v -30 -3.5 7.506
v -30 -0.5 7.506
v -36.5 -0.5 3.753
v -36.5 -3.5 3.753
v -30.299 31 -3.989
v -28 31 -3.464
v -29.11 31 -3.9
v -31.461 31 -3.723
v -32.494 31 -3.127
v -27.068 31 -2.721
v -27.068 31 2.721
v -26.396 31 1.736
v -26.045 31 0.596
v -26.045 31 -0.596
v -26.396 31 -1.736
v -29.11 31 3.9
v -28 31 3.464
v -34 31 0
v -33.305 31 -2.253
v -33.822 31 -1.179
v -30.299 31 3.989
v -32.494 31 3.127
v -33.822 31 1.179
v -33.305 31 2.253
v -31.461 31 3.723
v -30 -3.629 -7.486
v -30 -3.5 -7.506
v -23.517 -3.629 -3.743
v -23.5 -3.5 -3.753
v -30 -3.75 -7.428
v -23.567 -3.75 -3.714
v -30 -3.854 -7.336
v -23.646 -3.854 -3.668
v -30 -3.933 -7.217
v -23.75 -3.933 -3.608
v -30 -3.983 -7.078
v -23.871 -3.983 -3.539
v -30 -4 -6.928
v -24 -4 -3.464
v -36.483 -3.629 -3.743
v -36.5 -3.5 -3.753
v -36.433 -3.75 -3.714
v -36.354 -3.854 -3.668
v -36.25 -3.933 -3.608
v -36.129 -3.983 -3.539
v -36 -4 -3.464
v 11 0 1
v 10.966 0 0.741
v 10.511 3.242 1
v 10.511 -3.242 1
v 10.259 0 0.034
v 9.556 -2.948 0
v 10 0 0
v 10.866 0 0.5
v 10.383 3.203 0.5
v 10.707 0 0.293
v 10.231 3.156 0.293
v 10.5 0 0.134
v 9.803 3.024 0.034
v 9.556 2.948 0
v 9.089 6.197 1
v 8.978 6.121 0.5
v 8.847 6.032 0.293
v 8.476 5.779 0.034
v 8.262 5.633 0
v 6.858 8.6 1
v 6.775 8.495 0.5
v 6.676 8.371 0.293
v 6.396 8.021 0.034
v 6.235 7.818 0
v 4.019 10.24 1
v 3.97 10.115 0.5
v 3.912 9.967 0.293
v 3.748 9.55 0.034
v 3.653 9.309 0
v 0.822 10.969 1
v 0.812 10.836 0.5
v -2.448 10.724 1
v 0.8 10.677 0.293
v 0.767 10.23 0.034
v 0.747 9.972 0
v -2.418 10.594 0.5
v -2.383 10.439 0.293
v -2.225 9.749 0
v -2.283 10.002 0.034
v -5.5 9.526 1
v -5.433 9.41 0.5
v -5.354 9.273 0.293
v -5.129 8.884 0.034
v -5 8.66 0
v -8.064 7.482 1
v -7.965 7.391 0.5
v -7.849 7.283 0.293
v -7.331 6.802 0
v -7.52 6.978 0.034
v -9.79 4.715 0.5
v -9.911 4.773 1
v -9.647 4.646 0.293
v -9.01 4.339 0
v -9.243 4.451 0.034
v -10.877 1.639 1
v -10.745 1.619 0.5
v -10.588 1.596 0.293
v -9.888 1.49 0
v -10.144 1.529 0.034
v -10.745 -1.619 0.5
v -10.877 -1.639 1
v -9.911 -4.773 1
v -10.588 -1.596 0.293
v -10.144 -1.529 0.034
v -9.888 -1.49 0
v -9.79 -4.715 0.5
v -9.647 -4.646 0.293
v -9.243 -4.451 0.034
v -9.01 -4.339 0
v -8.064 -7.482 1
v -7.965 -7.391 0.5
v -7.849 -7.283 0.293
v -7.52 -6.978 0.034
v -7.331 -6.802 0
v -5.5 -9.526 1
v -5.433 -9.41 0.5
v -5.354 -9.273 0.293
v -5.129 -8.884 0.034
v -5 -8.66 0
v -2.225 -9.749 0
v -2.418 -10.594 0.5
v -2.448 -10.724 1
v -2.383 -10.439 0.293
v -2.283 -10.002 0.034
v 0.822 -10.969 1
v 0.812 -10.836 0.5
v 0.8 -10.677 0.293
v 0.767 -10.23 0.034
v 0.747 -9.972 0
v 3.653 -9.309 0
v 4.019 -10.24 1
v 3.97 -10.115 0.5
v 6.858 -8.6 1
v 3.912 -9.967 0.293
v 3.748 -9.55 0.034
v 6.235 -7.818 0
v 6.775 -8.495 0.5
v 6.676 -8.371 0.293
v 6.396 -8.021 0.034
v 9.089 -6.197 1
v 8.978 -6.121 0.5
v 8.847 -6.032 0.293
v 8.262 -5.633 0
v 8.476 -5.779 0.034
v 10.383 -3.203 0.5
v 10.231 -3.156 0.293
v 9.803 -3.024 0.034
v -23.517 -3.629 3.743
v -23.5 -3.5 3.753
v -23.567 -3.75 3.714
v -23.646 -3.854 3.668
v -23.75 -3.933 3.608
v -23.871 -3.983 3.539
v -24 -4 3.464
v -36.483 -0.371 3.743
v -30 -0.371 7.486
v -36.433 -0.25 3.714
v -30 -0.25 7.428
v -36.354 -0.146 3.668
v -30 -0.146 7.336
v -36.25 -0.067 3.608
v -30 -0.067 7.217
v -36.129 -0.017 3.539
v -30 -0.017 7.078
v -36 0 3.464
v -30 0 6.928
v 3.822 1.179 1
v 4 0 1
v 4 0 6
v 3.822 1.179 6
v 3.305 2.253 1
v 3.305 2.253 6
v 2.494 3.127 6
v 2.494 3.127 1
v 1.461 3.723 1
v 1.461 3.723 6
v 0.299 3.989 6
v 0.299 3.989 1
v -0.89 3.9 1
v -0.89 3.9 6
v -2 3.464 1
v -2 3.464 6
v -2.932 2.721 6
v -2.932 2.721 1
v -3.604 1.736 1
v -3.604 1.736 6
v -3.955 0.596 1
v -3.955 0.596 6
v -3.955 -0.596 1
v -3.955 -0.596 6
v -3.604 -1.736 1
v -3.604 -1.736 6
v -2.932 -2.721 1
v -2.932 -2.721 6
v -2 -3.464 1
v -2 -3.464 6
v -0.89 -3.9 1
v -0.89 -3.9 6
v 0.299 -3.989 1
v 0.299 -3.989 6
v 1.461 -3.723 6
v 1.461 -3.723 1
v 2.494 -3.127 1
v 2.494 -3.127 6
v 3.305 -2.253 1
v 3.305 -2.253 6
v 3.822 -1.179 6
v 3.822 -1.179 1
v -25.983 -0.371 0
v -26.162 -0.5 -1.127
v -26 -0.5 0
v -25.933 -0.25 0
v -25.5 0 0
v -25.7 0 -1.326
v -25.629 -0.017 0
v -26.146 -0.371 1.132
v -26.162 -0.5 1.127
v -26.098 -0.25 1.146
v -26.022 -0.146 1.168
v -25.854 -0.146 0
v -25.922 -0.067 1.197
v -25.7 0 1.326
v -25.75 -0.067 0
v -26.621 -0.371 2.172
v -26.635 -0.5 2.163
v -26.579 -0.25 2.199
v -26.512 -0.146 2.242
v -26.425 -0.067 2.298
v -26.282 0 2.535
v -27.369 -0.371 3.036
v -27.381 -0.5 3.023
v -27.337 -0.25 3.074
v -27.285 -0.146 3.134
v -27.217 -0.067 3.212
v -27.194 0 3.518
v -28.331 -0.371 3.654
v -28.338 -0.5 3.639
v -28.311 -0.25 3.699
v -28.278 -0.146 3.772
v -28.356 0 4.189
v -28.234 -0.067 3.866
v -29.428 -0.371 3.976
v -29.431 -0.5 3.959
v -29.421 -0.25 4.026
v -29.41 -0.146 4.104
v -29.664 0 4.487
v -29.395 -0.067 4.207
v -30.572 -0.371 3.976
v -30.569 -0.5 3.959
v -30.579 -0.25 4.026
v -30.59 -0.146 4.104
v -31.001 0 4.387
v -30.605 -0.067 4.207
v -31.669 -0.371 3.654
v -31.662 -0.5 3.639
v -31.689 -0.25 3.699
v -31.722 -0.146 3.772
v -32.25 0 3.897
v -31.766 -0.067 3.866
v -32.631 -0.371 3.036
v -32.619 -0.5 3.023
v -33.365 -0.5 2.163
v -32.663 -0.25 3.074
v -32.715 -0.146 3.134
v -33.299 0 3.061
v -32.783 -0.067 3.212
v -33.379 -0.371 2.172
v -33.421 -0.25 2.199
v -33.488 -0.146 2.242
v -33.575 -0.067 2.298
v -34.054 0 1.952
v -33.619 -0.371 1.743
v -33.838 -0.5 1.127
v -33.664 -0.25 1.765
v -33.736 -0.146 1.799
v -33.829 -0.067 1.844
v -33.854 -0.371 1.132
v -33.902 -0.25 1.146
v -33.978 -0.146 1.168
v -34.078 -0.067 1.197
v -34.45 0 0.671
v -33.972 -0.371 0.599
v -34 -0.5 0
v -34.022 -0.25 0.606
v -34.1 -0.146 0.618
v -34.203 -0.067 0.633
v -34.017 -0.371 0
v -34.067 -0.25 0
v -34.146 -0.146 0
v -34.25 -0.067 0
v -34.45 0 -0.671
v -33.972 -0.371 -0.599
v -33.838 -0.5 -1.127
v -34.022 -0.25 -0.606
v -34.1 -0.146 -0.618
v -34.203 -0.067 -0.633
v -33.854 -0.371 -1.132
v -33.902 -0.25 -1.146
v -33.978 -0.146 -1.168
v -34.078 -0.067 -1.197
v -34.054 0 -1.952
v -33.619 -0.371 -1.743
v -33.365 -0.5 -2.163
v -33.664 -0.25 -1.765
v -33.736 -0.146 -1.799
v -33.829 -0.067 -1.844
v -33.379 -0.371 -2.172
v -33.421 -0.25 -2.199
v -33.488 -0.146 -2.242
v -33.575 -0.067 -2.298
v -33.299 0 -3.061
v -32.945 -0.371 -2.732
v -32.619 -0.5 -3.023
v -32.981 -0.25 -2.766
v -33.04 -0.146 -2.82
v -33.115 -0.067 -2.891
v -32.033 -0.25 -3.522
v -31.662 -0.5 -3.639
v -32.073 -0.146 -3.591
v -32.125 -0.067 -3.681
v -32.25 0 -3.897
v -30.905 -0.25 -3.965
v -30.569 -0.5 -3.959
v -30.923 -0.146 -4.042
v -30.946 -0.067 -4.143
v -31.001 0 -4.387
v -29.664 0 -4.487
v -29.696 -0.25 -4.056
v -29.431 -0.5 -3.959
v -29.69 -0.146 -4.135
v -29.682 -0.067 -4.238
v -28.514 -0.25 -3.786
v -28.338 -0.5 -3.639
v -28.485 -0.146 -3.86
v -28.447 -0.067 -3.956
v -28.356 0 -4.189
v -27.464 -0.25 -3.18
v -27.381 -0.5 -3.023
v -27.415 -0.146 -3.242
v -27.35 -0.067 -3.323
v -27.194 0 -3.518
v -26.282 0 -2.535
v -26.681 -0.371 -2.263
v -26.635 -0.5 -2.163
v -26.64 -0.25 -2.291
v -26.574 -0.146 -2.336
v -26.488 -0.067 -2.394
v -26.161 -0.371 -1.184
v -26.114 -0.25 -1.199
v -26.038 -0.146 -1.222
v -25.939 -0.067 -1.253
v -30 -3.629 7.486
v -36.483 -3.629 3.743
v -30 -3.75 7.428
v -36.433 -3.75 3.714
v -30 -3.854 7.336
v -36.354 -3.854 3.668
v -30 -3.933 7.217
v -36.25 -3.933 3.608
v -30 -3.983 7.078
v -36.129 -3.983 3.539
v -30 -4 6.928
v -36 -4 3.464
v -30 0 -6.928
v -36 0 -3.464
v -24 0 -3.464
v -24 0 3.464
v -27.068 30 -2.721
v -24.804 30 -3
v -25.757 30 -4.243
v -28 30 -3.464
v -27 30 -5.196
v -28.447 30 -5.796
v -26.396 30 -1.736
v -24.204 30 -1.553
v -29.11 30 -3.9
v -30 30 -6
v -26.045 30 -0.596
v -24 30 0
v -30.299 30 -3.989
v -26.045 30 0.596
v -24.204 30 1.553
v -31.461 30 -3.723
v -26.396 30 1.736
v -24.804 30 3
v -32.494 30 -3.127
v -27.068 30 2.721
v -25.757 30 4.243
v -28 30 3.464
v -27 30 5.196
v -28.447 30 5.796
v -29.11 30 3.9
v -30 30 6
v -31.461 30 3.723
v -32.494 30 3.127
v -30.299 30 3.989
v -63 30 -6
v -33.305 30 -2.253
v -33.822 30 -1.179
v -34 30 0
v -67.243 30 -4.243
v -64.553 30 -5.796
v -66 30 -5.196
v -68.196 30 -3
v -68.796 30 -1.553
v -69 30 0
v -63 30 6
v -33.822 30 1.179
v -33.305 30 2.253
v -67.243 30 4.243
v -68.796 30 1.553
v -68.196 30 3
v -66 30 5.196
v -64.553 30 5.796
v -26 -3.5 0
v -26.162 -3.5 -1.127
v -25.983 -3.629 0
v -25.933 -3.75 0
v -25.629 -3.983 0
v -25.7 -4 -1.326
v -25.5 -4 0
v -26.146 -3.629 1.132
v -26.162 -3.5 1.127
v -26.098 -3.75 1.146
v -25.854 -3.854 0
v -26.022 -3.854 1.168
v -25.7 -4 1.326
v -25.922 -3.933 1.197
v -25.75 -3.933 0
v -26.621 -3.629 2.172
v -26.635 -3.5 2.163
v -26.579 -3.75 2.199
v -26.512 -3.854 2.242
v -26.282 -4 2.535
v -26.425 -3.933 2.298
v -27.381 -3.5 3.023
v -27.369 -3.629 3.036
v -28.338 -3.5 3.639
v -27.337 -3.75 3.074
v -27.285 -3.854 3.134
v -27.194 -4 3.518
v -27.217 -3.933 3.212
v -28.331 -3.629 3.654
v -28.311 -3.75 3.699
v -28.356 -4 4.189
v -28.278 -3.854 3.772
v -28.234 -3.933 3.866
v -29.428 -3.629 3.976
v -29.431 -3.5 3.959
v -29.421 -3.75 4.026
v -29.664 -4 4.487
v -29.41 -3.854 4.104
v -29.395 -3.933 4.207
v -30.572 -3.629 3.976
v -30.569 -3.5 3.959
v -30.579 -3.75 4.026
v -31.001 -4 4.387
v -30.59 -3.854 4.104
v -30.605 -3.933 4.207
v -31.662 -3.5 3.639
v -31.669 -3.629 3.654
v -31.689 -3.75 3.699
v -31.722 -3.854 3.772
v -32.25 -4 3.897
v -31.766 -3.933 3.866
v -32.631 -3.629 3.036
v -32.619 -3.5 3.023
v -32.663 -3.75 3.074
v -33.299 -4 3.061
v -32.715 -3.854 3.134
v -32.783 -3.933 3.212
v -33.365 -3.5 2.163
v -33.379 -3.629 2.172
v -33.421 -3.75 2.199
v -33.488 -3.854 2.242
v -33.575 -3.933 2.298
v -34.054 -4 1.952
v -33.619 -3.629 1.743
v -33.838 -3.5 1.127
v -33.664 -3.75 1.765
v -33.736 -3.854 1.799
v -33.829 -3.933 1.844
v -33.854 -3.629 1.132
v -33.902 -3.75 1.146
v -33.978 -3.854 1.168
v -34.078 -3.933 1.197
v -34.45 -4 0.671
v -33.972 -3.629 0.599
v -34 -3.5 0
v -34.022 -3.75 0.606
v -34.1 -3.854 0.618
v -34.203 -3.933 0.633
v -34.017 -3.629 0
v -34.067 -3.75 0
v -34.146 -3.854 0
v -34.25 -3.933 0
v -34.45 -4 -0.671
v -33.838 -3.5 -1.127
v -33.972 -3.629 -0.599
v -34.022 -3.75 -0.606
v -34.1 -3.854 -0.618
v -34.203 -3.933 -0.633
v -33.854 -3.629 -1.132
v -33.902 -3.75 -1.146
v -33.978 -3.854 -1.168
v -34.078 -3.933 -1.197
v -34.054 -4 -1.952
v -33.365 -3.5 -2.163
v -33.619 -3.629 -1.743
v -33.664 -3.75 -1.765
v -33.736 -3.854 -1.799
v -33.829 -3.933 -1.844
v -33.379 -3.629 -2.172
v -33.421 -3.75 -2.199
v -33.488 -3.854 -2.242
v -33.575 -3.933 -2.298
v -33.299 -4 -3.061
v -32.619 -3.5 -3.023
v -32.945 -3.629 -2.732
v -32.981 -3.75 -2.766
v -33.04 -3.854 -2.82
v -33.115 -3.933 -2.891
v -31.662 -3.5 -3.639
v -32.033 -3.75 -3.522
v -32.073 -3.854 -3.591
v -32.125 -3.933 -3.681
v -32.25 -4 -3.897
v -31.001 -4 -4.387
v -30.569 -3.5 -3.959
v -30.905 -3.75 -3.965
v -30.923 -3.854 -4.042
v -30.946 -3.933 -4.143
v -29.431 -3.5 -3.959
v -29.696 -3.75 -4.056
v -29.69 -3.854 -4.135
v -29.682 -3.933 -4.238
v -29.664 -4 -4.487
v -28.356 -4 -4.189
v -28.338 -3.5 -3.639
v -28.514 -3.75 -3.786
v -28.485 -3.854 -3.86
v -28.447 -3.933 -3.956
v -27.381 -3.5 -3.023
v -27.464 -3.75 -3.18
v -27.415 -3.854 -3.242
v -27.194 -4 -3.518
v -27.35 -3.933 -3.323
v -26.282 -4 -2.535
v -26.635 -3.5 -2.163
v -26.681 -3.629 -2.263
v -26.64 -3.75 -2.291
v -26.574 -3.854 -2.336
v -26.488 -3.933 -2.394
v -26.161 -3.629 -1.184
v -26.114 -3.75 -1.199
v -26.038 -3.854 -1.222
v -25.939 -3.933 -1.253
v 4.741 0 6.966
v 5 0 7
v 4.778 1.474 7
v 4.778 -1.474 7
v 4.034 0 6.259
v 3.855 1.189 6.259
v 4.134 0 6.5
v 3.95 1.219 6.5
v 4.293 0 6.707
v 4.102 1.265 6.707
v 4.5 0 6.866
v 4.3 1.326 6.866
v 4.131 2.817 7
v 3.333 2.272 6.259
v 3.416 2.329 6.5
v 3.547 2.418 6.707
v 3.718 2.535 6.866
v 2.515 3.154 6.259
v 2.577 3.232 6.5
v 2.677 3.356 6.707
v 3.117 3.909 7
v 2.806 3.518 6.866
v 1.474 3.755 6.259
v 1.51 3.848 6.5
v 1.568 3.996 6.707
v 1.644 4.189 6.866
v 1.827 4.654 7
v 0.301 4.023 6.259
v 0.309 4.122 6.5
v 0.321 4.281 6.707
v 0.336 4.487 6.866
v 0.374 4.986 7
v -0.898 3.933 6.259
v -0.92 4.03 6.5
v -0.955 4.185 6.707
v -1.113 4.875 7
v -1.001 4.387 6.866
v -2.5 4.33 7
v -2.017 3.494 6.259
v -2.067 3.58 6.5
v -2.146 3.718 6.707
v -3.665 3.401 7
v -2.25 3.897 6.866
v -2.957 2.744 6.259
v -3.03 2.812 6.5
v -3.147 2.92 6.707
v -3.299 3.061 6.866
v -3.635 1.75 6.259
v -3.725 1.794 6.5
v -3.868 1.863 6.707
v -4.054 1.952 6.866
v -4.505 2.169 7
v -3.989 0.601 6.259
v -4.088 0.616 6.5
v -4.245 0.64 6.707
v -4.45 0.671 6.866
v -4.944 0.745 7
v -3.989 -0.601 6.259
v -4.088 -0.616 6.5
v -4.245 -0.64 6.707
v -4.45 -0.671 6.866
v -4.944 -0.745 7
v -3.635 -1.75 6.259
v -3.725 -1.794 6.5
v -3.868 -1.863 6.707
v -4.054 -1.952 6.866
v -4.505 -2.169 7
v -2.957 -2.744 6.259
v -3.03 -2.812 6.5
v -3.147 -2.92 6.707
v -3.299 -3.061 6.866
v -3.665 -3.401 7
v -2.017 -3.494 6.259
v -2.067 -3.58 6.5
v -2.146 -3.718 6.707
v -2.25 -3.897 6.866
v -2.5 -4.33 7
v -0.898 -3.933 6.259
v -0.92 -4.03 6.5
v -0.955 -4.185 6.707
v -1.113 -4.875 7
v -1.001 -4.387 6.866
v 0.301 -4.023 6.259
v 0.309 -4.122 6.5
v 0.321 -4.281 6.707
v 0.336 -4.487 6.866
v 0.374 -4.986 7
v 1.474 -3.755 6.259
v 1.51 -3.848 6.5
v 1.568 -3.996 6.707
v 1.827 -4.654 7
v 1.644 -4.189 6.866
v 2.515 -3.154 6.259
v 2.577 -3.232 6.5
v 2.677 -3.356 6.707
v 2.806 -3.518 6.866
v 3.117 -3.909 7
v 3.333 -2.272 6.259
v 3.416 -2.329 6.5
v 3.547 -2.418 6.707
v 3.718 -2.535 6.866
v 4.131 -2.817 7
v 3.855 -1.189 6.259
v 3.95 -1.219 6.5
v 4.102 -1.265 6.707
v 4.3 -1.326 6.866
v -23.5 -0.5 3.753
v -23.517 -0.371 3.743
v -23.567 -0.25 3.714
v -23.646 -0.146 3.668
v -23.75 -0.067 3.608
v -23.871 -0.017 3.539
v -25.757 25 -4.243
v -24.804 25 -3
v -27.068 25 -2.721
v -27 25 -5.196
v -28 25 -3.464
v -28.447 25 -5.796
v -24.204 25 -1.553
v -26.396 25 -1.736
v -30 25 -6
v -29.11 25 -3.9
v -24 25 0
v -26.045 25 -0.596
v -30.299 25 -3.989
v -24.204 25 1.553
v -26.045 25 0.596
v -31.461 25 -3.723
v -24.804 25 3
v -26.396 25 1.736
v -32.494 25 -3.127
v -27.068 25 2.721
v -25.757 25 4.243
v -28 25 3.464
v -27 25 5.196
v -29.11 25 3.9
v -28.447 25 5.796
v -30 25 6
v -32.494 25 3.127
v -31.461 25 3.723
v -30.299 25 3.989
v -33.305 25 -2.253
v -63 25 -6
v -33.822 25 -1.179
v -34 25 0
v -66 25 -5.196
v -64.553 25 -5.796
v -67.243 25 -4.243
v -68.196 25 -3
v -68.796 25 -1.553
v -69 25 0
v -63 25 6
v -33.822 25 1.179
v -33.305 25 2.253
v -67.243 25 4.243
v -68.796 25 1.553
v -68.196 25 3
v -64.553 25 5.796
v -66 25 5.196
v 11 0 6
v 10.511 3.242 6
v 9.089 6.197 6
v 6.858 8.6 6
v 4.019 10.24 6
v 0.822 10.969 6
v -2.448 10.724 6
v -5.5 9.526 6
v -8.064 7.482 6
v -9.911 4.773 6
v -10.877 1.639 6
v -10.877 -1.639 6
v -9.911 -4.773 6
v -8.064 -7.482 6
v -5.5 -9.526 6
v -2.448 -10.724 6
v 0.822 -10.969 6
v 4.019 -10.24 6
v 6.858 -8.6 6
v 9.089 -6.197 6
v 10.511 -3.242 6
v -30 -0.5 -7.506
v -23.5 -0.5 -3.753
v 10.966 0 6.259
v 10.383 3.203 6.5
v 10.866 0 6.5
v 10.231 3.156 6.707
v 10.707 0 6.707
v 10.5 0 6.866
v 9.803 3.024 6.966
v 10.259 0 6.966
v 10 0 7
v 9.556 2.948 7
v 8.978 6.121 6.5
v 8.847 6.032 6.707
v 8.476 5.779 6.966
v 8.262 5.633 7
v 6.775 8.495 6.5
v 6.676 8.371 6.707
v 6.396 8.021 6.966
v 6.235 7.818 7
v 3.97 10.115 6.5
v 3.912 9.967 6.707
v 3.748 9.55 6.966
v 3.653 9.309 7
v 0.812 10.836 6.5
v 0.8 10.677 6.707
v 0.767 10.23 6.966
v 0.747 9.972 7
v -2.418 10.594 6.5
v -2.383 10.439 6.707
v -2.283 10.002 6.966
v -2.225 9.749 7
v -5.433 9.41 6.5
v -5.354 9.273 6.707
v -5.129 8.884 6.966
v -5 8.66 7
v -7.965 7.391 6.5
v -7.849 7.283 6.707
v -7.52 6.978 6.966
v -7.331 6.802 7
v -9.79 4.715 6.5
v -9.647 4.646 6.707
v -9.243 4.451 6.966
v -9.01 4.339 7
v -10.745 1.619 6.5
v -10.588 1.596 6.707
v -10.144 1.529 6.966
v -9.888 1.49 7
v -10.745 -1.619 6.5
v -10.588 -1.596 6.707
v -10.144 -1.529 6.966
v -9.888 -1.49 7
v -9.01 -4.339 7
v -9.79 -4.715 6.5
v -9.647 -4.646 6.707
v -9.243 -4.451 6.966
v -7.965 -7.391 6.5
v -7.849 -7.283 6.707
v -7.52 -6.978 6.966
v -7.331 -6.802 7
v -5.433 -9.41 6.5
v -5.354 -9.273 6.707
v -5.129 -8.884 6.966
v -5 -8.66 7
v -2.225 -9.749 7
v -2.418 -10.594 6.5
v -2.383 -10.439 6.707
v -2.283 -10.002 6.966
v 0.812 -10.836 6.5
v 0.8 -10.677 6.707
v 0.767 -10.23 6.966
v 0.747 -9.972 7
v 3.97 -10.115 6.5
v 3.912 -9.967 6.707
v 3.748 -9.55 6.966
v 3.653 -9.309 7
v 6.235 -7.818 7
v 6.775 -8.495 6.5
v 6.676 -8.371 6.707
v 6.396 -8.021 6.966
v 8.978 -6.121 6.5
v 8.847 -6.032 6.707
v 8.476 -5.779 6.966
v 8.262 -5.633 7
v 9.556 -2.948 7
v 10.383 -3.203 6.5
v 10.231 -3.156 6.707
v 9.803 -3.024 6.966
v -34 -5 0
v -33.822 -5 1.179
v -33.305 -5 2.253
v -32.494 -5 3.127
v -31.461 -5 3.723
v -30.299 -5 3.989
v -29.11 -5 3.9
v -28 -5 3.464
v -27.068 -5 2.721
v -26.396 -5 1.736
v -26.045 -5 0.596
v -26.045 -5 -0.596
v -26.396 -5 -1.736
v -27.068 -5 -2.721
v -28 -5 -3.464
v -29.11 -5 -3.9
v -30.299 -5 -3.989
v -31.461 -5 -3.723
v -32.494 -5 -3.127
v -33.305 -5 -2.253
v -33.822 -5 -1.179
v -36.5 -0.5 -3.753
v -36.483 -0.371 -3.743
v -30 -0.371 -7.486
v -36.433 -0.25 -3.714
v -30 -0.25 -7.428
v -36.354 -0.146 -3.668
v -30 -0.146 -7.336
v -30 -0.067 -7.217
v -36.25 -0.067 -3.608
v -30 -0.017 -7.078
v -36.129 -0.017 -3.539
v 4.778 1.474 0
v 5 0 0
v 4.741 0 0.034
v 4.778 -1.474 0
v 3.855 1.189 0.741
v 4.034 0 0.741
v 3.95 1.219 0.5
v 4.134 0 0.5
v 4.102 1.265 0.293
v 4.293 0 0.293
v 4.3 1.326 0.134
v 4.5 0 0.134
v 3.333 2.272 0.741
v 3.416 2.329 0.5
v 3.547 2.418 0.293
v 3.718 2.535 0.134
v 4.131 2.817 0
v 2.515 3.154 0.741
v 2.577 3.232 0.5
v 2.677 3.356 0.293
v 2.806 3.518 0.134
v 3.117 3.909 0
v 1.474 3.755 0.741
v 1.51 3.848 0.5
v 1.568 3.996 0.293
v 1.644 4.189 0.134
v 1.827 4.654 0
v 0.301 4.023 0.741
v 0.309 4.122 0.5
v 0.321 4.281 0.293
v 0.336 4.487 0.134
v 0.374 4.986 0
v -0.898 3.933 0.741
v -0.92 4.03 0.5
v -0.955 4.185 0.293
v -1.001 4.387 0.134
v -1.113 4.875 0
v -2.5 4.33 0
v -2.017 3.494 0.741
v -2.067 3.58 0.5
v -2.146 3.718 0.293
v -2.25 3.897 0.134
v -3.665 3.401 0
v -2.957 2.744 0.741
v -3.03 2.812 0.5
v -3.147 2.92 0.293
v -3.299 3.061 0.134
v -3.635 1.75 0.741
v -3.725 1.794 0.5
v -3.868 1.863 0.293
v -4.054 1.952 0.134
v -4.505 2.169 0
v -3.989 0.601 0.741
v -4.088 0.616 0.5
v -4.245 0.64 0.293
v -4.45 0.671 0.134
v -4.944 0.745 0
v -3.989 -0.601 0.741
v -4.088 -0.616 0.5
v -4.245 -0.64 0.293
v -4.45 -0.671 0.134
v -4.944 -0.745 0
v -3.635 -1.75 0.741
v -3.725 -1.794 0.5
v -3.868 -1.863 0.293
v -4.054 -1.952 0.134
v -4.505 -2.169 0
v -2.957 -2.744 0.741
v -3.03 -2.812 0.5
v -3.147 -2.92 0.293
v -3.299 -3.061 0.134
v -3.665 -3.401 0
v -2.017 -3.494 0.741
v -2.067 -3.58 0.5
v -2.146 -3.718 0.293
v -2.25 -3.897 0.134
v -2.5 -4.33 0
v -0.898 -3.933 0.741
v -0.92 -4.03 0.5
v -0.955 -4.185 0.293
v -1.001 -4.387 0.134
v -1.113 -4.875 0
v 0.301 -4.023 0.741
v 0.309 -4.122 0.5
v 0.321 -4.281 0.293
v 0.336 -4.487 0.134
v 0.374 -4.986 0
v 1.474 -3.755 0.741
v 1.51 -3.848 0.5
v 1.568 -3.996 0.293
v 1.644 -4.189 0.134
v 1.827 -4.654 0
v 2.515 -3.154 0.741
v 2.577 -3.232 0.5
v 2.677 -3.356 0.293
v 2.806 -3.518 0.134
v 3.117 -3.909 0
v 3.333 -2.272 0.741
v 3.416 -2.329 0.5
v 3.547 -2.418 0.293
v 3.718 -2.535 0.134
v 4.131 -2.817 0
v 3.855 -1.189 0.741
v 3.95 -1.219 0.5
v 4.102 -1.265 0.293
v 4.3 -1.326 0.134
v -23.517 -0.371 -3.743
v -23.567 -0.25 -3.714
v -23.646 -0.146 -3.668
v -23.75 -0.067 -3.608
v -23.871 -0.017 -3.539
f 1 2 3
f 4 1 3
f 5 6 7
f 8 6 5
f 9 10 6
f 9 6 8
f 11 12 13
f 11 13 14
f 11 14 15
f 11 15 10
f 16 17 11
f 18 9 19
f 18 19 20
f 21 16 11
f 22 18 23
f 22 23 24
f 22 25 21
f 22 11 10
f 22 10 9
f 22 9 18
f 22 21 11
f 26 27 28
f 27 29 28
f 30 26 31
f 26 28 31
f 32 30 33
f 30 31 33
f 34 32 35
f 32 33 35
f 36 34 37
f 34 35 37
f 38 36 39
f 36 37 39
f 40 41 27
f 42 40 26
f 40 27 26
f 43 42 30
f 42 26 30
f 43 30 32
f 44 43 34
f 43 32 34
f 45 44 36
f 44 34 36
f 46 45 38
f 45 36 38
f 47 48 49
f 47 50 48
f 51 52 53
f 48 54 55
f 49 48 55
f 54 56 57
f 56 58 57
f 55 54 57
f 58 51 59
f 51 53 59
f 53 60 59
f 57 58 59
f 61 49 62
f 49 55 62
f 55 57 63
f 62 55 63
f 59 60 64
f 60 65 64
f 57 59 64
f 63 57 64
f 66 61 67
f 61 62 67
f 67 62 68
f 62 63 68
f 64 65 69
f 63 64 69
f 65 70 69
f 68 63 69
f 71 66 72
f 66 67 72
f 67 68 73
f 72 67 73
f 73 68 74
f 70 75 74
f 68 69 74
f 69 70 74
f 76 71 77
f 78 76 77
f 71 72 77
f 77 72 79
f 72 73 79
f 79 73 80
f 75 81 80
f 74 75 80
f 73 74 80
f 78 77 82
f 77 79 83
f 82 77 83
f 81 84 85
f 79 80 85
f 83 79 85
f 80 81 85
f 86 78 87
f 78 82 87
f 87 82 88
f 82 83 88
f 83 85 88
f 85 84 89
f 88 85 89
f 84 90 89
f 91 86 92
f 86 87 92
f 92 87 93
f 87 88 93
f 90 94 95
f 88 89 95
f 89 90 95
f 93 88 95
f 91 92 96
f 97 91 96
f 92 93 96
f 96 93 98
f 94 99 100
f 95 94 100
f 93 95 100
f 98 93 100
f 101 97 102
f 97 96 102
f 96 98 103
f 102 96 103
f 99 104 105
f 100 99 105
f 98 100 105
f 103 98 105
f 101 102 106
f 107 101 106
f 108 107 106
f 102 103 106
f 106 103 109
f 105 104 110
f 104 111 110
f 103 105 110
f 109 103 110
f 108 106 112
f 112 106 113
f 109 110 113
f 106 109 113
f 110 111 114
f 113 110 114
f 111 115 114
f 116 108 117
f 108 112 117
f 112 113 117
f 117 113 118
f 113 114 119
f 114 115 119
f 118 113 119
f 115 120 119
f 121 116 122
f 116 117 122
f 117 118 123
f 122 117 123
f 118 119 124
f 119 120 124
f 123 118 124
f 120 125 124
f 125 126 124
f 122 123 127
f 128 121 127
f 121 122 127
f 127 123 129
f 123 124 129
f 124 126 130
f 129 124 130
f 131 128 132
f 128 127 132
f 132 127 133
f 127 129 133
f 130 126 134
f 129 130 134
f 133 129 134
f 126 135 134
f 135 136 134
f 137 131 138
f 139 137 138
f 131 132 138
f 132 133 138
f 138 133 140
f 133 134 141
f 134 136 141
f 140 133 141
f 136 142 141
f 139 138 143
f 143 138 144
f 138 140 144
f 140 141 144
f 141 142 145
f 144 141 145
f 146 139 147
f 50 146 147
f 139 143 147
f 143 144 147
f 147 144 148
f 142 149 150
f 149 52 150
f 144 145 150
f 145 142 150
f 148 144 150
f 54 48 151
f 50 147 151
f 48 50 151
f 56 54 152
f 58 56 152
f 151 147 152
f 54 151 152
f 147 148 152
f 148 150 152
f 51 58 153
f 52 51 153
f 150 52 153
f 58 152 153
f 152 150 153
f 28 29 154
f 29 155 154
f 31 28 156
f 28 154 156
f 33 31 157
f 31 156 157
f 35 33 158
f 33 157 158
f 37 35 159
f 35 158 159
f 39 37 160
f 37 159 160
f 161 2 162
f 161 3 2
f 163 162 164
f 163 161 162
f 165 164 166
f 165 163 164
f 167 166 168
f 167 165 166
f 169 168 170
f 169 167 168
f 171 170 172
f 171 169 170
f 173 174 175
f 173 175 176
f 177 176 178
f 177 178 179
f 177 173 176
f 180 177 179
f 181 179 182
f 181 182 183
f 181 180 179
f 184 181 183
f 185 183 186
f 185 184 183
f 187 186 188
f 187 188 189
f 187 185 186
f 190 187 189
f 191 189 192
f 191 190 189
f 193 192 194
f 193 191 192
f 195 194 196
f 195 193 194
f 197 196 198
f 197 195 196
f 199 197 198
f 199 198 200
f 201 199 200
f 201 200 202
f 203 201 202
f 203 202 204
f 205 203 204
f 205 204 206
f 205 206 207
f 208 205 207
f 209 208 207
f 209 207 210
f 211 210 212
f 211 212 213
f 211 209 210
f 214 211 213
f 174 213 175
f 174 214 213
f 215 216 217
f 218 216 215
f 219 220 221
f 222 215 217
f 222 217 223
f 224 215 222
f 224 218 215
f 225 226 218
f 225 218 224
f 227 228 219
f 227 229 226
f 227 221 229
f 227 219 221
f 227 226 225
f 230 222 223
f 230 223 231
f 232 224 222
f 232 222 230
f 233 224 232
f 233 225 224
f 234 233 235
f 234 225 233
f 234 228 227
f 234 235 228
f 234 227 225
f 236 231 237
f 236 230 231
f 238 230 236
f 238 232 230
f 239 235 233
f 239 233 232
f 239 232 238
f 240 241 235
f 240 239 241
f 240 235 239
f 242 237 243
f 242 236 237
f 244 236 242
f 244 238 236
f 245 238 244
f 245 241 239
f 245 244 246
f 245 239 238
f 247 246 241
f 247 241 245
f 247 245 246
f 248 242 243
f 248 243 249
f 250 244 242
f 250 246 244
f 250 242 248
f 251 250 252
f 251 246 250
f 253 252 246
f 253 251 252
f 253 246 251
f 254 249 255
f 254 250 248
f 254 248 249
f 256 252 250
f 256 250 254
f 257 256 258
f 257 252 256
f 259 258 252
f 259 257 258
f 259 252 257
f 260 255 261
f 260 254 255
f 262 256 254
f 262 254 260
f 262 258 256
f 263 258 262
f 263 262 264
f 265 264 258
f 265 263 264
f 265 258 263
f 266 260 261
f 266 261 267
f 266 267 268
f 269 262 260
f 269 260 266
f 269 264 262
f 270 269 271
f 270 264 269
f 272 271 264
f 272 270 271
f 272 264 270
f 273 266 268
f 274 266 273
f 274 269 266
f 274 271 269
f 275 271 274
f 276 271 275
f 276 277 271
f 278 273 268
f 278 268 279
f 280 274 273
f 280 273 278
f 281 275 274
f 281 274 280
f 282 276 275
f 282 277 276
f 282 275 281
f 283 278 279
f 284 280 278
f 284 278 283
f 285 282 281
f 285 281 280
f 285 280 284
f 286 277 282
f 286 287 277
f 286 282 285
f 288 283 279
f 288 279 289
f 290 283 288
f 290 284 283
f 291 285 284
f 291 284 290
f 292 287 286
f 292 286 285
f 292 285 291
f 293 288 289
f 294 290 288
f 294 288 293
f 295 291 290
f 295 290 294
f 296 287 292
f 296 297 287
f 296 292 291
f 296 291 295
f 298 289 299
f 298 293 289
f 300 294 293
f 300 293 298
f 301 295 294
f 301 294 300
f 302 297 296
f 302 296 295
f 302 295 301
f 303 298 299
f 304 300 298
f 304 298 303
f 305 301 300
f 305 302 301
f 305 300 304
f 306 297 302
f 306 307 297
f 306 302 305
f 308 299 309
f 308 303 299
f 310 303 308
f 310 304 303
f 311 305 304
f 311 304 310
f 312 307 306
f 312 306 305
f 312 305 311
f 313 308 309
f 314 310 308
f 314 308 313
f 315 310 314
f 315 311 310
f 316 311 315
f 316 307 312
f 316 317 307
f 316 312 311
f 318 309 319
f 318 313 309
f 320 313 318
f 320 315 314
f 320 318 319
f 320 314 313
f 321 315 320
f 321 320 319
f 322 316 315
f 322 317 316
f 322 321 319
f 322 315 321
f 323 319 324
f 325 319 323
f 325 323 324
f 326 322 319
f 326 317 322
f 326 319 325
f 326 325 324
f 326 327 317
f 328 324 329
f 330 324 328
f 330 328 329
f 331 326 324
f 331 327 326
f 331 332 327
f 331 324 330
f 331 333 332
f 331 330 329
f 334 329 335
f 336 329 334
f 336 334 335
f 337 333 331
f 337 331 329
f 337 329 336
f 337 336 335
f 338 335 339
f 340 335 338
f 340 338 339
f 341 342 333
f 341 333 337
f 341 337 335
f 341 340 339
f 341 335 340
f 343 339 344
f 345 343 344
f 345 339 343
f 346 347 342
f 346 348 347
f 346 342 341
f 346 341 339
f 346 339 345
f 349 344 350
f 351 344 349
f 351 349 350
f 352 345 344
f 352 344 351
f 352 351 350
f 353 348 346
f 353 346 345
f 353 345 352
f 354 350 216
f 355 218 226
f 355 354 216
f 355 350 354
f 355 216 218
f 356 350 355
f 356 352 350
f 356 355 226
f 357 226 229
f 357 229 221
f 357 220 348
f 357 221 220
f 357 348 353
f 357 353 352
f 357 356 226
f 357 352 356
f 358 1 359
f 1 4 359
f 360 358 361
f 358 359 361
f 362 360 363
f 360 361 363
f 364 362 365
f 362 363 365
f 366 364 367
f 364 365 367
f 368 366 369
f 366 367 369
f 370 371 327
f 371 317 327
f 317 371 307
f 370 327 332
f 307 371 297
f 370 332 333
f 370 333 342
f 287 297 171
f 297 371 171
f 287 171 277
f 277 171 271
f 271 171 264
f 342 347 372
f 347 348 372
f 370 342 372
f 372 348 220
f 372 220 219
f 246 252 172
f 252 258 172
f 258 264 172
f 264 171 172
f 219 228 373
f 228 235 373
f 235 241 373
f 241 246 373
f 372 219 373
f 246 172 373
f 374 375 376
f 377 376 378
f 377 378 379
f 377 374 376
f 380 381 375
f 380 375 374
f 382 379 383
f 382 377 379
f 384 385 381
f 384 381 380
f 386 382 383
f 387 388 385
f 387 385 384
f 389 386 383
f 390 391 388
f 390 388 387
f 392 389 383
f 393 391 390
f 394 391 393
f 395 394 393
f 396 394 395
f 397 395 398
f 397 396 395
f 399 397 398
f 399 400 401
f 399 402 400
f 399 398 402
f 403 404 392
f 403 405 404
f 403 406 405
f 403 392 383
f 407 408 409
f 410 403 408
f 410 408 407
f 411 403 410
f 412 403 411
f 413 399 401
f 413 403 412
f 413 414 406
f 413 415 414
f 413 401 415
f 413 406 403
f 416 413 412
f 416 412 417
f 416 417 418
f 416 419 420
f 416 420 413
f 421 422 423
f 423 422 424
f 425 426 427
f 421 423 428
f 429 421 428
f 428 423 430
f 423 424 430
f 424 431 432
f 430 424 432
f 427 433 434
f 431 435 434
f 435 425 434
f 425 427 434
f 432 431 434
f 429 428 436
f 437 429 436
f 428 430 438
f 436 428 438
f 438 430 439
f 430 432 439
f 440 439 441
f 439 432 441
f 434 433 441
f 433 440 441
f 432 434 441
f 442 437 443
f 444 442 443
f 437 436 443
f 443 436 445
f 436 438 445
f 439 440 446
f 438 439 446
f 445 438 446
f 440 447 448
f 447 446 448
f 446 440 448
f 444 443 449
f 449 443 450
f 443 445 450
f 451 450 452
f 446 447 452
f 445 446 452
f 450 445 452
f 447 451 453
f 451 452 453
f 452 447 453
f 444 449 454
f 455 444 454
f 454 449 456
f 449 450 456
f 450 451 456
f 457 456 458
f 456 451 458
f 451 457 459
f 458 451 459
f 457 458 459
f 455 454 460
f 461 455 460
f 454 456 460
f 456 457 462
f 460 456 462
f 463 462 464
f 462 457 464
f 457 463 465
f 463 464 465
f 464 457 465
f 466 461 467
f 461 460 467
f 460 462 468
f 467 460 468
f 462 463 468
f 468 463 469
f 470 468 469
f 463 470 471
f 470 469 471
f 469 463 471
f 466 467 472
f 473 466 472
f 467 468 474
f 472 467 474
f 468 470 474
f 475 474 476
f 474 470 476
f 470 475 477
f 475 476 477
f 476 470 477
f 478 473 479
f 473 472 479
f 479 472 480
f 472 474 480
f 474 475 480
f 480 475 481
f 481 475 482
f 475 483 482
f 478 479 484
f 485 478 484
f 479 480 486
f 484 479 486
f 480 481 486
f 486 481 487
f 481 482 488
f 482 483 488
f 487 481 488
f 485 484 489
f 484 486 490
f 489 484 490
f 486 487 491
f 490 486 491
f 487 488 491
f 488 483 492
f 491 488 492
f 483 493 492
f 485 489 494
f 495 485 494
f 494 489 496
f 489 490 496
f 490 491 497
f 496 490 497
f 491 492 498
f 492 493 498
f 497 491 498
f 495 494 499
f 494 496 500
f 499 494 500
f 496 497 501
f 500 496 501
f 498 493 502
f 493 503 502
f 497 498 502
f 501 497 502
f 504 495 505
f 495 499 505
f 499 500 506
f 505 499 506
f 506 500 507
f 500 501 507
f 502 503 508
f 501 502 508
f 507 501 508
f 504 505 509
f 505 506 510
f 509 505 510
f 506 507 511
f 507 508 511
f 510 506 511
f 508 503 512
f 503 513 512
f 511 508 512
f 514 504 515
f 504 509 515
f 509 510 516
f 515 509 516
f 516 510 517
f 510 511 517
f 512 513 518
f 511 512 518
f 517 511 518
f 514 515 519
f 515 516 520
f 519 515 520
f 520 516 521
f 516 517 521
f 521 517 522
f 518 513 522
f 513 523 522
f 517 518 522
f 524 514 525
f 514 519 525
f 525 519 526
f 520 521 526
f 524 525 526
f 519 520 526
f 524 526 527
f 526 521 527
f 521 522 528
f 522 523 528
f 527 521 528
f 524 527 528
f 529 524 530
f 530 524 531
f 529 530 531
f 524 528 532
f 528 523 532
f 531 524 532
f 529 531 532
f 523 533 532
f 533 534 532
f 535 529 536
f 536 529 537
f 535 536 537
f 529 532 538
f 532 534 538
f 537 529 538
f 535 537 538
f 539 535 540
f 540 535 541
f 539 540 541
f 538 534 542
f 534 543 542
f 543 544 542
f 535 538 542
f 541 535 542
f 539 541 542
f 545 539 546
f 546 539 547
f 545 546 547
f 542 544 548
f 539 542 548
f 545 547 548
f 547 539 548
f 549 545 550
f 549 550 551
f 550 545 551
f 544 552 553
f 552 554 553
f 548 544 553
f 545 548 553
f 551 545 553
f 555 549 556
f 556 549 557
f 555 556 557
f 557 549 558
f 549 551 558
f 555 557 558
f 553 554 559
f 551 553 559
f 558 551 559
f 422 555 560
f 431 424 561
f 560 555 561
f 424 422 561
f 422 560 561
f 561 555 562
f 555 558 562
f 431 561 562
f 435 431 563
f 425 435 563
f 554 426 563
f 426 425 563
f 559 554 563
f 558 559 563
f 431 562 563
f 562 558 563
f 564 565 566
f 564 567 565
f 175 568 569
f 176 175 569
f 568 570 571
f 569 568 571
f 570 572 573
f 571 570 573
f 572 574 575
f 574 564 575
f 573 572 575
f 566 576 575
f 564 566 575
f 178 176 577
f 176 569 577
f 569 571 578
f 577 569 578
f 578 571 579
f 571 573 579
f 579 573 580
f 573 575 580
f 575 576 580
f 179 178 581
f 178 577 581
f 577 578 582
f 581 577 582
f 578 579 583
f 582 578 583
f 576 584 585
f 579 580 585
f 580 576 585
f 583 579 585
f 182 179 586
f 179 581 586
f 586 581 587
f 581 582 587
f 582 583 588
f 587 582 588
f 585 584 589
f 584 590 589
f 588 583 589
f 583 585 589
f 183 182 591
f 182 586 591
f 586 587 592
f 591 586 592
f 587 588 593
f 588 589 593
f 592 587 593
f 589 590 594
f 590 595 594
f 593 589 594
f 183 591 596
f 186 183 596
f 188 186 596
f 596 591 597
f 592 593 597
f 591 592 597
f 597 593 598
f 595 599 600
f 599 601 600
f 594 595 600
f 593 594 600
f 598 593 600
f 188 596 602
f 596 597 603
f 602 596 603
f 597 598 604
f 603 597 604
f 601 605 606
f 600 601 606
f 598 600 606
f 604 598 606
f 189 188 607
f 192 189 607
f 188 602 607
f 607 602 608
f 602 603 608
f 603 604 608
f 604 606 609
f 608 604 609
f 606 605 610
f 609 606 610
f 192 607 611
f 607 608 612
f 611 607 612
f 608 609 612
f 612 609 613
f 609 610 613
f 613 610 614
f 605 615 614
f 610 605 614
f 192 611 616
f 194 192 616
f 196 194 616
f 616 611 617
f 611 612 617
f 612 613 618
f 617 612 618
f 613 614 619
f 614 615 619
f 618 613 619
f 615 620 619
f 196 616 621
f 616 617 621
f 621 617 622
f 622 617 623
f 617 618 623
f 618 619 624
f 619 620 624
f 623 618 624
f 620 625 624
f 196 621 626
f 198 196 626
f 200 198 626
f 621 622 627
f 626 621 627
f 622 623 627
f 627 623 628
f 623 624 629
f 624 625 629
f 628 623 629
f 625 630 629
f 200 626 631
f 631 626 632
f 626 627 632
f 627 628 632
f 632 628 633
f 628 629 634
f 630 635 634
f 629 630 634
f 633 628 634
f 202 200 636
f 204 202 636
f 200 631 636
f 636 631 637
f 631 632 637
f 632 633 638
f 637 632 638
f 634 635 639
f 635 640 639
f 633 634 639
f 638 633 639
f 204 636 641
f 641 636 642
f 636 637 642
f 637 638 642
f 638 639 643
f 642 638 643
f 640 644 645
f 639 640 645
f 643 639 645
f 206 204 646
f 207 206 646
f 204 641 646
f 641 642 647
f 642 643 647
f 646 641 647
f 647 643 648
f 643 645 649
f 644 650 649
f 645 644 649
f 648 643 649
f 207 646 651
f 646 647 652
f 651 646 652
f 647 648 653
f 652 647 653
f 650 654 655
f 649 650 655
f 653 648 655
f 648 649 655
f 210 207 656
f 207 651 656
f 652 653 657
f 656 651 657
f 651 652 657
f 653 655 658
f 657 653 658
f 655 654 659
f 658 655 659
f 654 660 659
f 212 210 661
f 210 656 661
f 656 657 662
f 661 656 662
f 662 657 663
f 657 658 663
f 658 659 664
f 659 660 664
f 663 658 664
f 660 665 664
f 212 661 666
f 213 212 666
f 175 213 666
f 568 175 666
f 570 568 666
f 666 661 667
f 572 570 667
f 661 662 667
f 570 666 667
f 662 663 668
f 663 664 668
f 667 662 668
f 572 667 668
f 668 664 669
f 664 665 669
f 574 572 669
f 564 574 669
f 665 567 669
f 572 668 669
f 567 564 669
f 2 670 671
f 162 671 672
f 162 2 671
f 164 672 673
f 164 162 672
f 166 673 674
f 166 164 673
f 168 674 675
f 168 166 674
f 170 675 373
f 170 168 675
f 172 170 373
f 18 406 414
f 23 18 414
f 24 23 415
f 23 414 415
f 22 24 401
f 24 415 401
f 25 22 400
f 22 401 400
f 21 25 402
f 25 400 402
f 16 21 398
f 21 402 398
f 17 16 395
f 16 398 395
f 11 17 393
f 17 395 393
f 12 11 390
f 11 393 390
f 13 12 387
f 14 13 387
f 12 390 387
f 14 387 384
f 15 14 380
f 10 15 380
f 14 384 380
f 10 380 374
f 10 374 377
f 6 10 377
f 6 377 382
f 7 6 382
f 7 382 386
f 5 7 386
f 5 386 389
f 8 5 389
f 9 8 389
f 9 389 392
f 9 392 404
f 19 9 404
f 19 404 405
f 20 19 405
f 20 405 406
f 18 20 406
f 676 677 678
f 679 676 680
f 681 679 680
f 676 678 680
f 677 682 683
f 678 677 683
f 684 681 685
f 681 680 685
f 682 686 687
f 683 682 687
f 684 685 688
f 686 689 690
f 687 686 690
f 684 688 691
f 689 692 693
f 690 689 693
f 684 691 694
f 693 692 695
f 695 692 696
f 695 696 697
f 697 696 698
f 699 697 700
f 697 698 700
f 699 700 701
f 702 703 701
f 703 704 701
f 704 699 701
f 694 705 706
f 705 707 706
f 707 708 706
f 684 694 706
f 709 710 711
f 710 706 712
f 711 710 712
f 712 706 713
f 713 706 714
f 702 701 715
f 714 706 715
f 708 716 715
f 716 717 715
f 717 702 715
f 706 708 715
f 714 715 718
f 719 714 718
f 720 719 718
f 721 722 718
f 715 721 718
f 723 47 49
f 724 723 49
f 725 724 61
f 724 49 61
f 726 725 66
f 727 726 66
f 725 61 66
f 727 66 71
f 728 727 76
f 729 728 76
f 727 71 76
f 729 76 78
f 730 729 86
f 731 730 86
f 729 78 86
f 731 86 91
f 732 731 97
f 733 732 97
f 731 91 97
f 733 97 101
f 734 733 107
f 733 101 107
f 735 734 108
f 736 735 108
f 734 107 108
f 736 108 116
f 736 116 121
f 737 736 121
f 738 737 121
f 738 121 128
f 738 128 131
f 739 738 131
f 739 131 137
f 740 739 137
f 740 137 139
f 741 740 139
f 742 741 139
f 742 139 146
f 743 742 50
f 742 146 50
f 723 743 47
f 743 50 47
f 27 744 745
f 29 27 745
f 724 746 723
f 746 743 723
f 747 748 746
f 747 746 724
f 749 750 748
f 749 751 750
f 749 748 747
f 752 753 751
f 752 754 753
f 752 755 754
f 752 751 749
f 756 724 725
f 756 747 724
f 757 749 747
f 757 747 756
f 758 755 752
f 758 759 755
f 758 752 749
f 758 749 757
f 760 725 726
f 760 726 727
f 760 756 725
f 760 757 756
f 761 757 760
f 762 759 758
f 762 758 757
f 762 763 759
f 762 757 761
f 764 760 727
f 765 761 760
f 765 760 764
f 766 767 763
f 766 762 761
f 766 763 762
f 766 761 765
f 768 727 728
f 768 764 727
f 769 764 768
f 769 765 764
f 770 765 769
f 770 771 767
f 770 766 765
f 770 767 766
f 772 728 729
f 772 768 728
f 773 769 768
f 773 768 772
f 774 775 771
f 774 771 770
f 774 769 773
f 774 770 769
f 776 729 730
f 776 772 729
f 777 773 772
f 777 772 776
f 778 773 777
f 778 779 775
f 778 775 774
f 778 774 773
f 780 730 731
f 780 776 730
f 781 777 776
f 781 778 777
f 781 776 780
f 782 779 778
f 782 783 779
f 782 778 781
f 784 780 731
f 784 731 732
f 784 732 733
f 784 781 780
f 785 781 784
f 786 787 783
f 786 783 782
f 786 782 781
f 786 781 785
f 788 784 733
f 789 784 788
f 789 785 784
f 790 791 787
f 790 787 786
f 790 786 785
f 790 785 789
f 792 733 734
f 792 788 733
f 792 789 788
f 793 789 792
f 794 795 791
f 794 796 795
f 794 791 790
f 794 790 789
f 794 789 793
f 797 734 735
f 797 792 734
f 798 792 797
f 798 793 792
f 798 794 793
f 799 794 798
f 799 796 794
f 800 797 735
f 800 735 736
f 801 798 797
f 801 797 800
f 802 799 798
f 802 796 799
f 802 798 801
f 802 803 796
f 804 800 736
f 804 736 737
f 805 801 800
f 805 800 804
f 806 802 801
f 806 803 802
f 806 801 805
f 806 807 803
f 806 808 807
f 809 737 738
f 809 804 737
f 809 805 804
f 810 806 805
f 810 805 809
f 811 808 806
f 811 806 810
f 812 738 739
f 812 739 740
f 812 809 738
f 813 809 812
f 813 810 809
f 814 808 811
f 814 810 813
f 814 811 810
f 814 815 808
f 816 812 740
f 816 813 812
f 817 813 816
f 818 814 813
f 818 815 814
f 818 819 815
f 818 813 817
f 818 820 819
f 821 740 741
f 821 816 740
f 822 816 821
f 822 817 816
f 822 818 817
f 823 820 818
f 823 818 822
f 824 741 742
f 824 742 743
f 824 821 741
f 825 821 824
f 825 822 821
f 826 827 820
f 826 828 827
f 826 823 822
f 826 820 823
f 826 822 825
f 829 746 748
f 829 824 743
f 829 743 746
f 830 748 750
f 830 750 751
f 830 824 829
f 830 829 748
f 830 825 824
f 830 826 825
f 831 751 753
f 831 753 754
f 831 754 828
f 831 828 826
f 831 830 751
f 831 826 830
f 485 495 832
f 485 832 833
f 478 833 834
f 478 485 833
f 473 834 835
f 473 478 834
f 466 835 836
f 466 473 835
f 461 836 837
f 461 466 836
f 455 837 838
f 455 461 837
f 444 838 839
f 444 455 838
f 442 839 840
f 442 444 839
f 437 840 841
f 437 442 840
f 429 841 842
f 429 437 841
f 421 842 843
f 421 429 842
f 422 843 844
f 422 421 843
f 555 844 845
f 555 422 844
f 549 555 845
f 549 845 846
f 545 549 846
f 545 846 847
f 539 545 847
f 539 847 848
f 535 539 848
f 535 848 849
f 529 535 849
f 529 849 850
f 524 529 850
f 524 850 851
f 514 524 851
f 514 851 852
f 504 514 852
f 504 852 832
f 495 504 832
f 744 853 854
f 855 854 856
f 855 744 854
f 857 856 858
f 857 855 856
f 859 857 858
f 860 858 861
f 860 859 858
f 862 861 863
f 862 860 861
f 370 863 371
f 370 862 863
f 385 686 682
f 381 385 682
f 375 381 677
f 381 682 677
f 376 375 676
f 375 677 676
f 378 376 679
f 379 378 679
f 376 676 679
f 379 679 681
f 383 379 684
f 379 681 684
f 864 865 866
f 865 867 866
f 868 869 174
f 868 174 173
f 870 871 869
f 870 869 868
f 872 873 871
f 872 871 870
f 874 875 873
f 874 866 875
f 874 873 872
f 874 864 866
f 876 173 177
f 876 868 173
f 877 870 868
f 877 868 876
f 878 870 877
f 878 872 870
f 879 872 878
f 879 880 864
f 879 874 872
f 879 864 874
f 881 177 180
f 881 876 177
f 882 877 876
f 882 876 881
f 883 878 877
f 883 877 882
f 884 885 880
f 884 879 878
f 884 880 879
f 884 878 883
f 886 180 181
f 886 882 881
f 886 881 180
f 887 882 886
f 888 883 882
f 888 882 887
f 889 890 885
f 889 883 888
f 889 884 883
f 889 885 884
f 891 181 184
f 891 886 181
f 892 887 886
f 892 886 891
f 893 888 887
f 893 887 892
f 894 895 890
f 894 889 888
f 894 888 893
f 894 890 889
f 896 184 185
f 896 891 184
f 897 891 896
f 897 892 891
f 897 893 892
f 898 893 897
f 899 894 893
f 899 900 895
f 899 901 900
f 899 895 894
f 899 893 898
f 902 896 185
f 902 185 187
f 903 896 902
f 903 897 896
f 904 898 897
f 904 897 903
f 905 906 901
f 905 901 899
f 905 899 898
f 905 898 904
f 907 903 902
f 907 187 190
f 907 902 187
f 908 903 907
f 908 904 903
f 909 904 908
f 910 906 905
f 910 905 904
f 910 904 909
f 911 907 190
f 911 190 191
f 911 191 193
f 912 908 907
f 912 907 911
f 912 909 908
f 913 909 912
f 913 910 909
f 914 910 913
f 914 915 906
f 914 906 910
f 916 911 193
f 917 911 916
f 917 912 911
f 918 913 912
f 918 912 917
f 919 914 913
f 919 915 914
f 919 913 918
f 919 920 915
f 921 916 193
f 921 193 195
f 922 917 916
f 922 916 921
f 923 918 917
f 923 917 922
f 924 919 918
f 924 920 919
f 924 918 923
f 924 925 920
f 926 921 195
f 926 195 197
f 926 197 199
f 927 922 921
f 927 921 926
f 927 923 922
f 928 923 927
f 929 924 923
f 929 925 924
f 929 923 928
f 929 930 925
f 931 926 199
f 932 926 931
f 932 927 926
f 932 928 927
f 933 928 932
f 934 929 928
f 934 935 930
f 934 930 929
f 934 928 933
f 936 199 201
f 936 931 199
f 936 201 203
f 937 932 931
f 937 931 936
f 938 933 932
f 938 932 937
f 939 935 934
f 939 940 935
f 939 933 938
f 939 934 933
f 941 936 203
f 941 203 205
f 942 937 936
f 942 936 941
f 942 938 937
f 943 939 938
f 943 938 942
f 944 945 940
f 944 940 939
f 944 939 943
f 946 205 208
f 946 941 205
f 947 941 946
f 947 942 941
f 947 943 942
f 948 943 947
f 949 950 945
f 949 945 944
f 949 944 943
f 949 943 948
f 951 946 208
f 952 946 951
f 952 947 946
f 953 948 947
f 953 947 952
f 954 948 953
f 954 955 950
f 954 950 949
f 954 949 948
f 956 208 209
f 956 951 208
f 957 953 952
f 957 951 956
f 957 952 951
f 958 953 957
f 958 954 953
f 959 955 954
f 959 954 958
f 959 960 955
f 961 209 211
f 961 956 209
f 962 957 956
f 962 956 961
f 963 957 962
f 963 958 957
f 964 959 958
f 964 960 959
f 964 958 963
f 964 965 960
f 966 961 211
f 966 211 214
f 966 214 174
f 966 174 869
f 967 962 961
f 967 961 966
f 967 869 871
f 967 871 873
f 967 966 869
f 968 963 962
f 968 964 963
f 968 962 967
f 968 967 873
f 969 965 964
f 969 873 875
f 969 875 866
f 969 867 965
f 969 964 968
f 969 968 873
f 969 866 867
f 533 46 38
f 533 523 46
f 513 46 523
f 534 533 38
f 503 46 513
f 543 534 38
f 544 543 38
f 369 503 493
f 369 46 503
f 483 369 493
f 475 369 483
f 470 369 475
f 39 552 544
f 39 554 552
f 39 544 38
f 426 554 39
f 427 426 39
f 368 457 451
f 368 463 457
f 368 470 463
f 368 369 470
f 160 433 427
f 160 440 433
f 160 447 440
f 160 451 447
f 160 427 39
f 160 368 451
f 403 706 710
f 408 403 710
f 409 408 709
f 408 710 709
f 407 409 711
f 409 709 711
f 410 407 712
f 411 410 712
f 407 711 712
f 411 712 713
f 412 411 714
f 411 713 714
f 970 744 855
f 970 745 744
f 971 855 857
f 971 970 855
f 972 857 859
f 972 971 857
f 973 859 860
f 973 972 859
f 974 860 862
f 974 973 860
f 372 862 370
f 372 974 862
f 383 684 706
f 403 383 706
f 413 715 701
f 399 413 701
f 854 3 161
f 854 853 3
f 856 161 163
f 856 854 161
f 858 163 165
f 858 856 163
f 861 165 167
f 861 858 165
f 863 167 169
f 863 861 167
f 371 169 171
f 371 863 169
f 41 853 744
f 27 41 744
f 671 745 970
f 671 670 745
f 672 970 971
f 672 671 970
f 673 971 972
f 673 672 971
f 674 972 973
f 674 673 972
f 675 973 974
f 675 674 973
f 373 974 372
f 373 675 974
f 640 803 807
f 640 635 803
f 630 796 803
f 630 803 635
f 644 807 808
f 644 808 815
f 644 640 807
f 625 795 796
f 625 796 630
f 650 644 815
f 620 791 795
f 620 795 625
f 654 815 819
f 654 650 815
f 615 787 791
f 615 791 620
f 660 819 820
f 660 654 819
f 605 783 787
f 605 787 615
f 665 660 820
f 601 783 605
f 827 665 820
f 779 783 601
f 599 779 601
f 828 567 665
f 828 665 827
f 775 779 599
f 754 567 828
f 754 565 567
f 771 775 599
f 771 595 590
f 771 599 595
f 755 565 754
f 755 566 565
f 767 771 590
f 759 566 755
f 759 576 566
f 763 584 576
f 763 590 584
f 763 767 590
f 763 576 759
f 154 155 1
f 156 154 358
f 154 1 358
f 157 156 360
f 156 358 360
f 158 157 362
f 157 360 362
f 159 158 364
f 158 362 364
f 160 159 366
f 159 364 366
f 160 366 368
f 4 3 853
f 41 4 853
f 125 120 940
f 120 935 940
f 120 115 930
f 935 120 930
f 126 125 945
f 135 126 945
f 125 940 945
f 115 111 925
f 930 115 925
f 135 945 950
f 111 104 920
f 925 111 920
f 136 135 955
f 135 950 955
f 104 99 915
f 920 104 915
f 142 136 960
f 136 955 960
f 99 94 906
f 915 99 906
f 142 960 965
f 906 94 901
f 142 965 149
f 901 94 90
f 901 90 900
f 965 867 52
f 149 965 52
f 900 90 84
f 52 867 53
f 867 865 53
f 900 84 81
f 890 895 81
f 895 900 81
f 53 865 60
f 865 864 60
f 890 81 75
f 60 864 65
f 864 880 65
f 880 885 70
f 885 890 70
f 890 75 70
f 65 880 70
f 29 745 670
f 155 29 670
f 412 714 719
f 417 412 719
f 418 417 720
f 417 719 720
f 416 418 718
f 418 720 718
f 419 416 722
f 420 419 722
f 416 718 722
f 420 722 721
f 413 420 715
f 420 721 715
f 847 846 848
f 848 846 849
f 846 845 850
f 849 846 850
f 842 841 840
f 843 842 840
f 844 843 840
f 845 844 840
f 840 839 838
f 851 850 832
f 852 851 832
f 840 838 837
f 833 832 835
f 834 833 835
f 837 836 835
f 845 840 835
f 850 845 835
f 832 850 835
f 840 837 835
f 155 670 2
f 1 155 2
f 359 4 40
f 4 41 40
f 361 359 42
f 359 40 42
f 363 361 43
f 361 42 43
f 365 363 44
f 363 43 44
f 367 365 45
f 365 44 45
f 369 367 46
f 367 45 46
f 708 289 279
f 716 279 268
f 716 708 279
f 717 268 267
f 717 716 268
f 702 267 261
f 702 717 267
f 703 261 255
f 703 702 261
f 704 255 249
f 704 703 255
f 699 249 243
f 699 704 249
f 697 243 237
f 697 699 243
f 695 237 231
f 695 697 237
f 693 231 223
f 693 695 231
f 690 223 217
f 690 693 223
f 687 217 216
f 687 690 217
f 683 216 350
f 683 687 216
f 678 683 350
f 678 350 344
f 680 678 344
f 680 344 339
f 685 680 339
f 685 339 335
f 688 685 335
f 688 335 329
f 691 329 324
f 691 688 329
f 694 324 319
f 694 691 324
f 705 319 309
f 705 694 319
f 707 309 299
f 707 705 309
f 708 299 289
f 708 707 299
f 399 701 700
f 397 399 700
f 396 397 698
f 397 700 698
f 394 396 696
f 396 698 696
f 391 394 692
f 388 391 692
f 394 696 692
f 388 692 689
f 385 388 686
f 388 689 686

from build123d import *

# Parameters (mm, degrees)
F0_R          = 11
F0_R_2        = 4
F1_DEPTH      = 7
F2_R          = 1
F3_R          = 4
F4_DEPTH      = 4
F5_R          = 0.5
F6_R          = 4
F7_DEPTH      = 25
F7_DEPTH_BACK = 5
F8_R          = 4
F9_DEPTH      = 5
F7_FACE_R     = 4
F10_DEPTH     = 6


with BuildPart() as f1:
    # F0 (on Top) → F1 (new body)
    with BuildSketch(Plane.XY):
        Circle(F0_R)
        Circle(F0_R_2, mode=Mode.SUBTRACT)
    extrude(amount=F1_DEPTH)

    # F2
    f2_edges = [f1.edges().sort_by_distance(p)[0] for p in [
        (-11, 0, 7),
        (11, 0, 3.5),
        (-11, 0, 0),
        (-4, 0, 7),
        (4, 0, 3.5),
        (-4, 0, 0),
    ]]
    fillet(f2_edges, radius=F2_R)


with BuildPart() as f4:
    # F3 (on Front) → F4 (new body)
    with BuildSketch(Plane.XZ):
        Polygon((-23.5, -3.752777), (-23.5, 3.752777), (-30, 7.505553), (-36.5, 3.752777), (-36.5, -3.752777), (-30, -7.505553), align=None)
        with Locations((-30, 0)):
            Circle(F3_R, mode=Mode.SUBTRACT)
    extrude(amount=F4_DEPTH)

    # F5
    f5_edges = [f4.edges().sort_by_distance(p)[0] for p in [
        (-26.75, -4, -5.629165),
        (-23.5, -4, 0),
        (-26.75, -4, 5.629165),
        (-33.25, -4, 5.629165),
        (-36.5, -4, 0),
        (-33.25, -4, -5.629165),
        (-34, -4, 0),
        (-26.75, 0, -5.629165),
        (-23.5, 0, 0),
        (-26.75, 0, 5.629165),
        (-33.25, 0, 5.629165),
        (-36.5, 0, 0),
        (-33.25, 0, -5.629165),
        (-34, 0, 0),
    ]]
    fillet(f5_edges, radius=F5_R)

    # F6 (on face) → F7 (join, two sides)
    with BuildSketch(Plane(origin=(0, 0, 0), x_dir=(-1, 0, 0), z_dir=(0, 1, 0))) as f7_sk:
        with Locations((30, 0)):
            Circle(F6_R)
    extrude(amount=F7_DEPTH)
    extrude(f7_sk.sketch, amount=-F7_DEPTH_BACK)

    # F8 (on face) → F9 (join)
    with BuildSketch(Plane(origin=(0, 25, 0), x_dir=(-1, 0, 0), z_dir=(0, 1, 0))):
        with BuildLine():
            Line((63, 6), (30, 6))
            ThreePointArc((30, 6), (25.757359, 4.242641), (24, 0))
            ThreePointArc((24, 0), (25.757359, -4.242641), (30, -6))
            Line((30, -6), (63, -6))
            ThreePointArc((63, -6), (67.242641, -4.242641), (69, 0))
            ThreePointArc((69, 0), (67.242641, 4.242641), (63, 6))
        make_face()
        with Locations((30, 0)):
            Circle(F8_R, mode=Mode.SUBTRACT)
    extrude(amount=F9_DEPTH)

    # F7_face (on face) → F10 (join)
    with BuildSketch(Plane(origin=(-30, 25, 0), x_dir=(-1, 0, 0), z_dir=(0, 1, 0))):
        Circle(F7_FACE_R)
    extrude(amount=F10_DEPTH)


solid = Compound([f1.part, f4.part])
